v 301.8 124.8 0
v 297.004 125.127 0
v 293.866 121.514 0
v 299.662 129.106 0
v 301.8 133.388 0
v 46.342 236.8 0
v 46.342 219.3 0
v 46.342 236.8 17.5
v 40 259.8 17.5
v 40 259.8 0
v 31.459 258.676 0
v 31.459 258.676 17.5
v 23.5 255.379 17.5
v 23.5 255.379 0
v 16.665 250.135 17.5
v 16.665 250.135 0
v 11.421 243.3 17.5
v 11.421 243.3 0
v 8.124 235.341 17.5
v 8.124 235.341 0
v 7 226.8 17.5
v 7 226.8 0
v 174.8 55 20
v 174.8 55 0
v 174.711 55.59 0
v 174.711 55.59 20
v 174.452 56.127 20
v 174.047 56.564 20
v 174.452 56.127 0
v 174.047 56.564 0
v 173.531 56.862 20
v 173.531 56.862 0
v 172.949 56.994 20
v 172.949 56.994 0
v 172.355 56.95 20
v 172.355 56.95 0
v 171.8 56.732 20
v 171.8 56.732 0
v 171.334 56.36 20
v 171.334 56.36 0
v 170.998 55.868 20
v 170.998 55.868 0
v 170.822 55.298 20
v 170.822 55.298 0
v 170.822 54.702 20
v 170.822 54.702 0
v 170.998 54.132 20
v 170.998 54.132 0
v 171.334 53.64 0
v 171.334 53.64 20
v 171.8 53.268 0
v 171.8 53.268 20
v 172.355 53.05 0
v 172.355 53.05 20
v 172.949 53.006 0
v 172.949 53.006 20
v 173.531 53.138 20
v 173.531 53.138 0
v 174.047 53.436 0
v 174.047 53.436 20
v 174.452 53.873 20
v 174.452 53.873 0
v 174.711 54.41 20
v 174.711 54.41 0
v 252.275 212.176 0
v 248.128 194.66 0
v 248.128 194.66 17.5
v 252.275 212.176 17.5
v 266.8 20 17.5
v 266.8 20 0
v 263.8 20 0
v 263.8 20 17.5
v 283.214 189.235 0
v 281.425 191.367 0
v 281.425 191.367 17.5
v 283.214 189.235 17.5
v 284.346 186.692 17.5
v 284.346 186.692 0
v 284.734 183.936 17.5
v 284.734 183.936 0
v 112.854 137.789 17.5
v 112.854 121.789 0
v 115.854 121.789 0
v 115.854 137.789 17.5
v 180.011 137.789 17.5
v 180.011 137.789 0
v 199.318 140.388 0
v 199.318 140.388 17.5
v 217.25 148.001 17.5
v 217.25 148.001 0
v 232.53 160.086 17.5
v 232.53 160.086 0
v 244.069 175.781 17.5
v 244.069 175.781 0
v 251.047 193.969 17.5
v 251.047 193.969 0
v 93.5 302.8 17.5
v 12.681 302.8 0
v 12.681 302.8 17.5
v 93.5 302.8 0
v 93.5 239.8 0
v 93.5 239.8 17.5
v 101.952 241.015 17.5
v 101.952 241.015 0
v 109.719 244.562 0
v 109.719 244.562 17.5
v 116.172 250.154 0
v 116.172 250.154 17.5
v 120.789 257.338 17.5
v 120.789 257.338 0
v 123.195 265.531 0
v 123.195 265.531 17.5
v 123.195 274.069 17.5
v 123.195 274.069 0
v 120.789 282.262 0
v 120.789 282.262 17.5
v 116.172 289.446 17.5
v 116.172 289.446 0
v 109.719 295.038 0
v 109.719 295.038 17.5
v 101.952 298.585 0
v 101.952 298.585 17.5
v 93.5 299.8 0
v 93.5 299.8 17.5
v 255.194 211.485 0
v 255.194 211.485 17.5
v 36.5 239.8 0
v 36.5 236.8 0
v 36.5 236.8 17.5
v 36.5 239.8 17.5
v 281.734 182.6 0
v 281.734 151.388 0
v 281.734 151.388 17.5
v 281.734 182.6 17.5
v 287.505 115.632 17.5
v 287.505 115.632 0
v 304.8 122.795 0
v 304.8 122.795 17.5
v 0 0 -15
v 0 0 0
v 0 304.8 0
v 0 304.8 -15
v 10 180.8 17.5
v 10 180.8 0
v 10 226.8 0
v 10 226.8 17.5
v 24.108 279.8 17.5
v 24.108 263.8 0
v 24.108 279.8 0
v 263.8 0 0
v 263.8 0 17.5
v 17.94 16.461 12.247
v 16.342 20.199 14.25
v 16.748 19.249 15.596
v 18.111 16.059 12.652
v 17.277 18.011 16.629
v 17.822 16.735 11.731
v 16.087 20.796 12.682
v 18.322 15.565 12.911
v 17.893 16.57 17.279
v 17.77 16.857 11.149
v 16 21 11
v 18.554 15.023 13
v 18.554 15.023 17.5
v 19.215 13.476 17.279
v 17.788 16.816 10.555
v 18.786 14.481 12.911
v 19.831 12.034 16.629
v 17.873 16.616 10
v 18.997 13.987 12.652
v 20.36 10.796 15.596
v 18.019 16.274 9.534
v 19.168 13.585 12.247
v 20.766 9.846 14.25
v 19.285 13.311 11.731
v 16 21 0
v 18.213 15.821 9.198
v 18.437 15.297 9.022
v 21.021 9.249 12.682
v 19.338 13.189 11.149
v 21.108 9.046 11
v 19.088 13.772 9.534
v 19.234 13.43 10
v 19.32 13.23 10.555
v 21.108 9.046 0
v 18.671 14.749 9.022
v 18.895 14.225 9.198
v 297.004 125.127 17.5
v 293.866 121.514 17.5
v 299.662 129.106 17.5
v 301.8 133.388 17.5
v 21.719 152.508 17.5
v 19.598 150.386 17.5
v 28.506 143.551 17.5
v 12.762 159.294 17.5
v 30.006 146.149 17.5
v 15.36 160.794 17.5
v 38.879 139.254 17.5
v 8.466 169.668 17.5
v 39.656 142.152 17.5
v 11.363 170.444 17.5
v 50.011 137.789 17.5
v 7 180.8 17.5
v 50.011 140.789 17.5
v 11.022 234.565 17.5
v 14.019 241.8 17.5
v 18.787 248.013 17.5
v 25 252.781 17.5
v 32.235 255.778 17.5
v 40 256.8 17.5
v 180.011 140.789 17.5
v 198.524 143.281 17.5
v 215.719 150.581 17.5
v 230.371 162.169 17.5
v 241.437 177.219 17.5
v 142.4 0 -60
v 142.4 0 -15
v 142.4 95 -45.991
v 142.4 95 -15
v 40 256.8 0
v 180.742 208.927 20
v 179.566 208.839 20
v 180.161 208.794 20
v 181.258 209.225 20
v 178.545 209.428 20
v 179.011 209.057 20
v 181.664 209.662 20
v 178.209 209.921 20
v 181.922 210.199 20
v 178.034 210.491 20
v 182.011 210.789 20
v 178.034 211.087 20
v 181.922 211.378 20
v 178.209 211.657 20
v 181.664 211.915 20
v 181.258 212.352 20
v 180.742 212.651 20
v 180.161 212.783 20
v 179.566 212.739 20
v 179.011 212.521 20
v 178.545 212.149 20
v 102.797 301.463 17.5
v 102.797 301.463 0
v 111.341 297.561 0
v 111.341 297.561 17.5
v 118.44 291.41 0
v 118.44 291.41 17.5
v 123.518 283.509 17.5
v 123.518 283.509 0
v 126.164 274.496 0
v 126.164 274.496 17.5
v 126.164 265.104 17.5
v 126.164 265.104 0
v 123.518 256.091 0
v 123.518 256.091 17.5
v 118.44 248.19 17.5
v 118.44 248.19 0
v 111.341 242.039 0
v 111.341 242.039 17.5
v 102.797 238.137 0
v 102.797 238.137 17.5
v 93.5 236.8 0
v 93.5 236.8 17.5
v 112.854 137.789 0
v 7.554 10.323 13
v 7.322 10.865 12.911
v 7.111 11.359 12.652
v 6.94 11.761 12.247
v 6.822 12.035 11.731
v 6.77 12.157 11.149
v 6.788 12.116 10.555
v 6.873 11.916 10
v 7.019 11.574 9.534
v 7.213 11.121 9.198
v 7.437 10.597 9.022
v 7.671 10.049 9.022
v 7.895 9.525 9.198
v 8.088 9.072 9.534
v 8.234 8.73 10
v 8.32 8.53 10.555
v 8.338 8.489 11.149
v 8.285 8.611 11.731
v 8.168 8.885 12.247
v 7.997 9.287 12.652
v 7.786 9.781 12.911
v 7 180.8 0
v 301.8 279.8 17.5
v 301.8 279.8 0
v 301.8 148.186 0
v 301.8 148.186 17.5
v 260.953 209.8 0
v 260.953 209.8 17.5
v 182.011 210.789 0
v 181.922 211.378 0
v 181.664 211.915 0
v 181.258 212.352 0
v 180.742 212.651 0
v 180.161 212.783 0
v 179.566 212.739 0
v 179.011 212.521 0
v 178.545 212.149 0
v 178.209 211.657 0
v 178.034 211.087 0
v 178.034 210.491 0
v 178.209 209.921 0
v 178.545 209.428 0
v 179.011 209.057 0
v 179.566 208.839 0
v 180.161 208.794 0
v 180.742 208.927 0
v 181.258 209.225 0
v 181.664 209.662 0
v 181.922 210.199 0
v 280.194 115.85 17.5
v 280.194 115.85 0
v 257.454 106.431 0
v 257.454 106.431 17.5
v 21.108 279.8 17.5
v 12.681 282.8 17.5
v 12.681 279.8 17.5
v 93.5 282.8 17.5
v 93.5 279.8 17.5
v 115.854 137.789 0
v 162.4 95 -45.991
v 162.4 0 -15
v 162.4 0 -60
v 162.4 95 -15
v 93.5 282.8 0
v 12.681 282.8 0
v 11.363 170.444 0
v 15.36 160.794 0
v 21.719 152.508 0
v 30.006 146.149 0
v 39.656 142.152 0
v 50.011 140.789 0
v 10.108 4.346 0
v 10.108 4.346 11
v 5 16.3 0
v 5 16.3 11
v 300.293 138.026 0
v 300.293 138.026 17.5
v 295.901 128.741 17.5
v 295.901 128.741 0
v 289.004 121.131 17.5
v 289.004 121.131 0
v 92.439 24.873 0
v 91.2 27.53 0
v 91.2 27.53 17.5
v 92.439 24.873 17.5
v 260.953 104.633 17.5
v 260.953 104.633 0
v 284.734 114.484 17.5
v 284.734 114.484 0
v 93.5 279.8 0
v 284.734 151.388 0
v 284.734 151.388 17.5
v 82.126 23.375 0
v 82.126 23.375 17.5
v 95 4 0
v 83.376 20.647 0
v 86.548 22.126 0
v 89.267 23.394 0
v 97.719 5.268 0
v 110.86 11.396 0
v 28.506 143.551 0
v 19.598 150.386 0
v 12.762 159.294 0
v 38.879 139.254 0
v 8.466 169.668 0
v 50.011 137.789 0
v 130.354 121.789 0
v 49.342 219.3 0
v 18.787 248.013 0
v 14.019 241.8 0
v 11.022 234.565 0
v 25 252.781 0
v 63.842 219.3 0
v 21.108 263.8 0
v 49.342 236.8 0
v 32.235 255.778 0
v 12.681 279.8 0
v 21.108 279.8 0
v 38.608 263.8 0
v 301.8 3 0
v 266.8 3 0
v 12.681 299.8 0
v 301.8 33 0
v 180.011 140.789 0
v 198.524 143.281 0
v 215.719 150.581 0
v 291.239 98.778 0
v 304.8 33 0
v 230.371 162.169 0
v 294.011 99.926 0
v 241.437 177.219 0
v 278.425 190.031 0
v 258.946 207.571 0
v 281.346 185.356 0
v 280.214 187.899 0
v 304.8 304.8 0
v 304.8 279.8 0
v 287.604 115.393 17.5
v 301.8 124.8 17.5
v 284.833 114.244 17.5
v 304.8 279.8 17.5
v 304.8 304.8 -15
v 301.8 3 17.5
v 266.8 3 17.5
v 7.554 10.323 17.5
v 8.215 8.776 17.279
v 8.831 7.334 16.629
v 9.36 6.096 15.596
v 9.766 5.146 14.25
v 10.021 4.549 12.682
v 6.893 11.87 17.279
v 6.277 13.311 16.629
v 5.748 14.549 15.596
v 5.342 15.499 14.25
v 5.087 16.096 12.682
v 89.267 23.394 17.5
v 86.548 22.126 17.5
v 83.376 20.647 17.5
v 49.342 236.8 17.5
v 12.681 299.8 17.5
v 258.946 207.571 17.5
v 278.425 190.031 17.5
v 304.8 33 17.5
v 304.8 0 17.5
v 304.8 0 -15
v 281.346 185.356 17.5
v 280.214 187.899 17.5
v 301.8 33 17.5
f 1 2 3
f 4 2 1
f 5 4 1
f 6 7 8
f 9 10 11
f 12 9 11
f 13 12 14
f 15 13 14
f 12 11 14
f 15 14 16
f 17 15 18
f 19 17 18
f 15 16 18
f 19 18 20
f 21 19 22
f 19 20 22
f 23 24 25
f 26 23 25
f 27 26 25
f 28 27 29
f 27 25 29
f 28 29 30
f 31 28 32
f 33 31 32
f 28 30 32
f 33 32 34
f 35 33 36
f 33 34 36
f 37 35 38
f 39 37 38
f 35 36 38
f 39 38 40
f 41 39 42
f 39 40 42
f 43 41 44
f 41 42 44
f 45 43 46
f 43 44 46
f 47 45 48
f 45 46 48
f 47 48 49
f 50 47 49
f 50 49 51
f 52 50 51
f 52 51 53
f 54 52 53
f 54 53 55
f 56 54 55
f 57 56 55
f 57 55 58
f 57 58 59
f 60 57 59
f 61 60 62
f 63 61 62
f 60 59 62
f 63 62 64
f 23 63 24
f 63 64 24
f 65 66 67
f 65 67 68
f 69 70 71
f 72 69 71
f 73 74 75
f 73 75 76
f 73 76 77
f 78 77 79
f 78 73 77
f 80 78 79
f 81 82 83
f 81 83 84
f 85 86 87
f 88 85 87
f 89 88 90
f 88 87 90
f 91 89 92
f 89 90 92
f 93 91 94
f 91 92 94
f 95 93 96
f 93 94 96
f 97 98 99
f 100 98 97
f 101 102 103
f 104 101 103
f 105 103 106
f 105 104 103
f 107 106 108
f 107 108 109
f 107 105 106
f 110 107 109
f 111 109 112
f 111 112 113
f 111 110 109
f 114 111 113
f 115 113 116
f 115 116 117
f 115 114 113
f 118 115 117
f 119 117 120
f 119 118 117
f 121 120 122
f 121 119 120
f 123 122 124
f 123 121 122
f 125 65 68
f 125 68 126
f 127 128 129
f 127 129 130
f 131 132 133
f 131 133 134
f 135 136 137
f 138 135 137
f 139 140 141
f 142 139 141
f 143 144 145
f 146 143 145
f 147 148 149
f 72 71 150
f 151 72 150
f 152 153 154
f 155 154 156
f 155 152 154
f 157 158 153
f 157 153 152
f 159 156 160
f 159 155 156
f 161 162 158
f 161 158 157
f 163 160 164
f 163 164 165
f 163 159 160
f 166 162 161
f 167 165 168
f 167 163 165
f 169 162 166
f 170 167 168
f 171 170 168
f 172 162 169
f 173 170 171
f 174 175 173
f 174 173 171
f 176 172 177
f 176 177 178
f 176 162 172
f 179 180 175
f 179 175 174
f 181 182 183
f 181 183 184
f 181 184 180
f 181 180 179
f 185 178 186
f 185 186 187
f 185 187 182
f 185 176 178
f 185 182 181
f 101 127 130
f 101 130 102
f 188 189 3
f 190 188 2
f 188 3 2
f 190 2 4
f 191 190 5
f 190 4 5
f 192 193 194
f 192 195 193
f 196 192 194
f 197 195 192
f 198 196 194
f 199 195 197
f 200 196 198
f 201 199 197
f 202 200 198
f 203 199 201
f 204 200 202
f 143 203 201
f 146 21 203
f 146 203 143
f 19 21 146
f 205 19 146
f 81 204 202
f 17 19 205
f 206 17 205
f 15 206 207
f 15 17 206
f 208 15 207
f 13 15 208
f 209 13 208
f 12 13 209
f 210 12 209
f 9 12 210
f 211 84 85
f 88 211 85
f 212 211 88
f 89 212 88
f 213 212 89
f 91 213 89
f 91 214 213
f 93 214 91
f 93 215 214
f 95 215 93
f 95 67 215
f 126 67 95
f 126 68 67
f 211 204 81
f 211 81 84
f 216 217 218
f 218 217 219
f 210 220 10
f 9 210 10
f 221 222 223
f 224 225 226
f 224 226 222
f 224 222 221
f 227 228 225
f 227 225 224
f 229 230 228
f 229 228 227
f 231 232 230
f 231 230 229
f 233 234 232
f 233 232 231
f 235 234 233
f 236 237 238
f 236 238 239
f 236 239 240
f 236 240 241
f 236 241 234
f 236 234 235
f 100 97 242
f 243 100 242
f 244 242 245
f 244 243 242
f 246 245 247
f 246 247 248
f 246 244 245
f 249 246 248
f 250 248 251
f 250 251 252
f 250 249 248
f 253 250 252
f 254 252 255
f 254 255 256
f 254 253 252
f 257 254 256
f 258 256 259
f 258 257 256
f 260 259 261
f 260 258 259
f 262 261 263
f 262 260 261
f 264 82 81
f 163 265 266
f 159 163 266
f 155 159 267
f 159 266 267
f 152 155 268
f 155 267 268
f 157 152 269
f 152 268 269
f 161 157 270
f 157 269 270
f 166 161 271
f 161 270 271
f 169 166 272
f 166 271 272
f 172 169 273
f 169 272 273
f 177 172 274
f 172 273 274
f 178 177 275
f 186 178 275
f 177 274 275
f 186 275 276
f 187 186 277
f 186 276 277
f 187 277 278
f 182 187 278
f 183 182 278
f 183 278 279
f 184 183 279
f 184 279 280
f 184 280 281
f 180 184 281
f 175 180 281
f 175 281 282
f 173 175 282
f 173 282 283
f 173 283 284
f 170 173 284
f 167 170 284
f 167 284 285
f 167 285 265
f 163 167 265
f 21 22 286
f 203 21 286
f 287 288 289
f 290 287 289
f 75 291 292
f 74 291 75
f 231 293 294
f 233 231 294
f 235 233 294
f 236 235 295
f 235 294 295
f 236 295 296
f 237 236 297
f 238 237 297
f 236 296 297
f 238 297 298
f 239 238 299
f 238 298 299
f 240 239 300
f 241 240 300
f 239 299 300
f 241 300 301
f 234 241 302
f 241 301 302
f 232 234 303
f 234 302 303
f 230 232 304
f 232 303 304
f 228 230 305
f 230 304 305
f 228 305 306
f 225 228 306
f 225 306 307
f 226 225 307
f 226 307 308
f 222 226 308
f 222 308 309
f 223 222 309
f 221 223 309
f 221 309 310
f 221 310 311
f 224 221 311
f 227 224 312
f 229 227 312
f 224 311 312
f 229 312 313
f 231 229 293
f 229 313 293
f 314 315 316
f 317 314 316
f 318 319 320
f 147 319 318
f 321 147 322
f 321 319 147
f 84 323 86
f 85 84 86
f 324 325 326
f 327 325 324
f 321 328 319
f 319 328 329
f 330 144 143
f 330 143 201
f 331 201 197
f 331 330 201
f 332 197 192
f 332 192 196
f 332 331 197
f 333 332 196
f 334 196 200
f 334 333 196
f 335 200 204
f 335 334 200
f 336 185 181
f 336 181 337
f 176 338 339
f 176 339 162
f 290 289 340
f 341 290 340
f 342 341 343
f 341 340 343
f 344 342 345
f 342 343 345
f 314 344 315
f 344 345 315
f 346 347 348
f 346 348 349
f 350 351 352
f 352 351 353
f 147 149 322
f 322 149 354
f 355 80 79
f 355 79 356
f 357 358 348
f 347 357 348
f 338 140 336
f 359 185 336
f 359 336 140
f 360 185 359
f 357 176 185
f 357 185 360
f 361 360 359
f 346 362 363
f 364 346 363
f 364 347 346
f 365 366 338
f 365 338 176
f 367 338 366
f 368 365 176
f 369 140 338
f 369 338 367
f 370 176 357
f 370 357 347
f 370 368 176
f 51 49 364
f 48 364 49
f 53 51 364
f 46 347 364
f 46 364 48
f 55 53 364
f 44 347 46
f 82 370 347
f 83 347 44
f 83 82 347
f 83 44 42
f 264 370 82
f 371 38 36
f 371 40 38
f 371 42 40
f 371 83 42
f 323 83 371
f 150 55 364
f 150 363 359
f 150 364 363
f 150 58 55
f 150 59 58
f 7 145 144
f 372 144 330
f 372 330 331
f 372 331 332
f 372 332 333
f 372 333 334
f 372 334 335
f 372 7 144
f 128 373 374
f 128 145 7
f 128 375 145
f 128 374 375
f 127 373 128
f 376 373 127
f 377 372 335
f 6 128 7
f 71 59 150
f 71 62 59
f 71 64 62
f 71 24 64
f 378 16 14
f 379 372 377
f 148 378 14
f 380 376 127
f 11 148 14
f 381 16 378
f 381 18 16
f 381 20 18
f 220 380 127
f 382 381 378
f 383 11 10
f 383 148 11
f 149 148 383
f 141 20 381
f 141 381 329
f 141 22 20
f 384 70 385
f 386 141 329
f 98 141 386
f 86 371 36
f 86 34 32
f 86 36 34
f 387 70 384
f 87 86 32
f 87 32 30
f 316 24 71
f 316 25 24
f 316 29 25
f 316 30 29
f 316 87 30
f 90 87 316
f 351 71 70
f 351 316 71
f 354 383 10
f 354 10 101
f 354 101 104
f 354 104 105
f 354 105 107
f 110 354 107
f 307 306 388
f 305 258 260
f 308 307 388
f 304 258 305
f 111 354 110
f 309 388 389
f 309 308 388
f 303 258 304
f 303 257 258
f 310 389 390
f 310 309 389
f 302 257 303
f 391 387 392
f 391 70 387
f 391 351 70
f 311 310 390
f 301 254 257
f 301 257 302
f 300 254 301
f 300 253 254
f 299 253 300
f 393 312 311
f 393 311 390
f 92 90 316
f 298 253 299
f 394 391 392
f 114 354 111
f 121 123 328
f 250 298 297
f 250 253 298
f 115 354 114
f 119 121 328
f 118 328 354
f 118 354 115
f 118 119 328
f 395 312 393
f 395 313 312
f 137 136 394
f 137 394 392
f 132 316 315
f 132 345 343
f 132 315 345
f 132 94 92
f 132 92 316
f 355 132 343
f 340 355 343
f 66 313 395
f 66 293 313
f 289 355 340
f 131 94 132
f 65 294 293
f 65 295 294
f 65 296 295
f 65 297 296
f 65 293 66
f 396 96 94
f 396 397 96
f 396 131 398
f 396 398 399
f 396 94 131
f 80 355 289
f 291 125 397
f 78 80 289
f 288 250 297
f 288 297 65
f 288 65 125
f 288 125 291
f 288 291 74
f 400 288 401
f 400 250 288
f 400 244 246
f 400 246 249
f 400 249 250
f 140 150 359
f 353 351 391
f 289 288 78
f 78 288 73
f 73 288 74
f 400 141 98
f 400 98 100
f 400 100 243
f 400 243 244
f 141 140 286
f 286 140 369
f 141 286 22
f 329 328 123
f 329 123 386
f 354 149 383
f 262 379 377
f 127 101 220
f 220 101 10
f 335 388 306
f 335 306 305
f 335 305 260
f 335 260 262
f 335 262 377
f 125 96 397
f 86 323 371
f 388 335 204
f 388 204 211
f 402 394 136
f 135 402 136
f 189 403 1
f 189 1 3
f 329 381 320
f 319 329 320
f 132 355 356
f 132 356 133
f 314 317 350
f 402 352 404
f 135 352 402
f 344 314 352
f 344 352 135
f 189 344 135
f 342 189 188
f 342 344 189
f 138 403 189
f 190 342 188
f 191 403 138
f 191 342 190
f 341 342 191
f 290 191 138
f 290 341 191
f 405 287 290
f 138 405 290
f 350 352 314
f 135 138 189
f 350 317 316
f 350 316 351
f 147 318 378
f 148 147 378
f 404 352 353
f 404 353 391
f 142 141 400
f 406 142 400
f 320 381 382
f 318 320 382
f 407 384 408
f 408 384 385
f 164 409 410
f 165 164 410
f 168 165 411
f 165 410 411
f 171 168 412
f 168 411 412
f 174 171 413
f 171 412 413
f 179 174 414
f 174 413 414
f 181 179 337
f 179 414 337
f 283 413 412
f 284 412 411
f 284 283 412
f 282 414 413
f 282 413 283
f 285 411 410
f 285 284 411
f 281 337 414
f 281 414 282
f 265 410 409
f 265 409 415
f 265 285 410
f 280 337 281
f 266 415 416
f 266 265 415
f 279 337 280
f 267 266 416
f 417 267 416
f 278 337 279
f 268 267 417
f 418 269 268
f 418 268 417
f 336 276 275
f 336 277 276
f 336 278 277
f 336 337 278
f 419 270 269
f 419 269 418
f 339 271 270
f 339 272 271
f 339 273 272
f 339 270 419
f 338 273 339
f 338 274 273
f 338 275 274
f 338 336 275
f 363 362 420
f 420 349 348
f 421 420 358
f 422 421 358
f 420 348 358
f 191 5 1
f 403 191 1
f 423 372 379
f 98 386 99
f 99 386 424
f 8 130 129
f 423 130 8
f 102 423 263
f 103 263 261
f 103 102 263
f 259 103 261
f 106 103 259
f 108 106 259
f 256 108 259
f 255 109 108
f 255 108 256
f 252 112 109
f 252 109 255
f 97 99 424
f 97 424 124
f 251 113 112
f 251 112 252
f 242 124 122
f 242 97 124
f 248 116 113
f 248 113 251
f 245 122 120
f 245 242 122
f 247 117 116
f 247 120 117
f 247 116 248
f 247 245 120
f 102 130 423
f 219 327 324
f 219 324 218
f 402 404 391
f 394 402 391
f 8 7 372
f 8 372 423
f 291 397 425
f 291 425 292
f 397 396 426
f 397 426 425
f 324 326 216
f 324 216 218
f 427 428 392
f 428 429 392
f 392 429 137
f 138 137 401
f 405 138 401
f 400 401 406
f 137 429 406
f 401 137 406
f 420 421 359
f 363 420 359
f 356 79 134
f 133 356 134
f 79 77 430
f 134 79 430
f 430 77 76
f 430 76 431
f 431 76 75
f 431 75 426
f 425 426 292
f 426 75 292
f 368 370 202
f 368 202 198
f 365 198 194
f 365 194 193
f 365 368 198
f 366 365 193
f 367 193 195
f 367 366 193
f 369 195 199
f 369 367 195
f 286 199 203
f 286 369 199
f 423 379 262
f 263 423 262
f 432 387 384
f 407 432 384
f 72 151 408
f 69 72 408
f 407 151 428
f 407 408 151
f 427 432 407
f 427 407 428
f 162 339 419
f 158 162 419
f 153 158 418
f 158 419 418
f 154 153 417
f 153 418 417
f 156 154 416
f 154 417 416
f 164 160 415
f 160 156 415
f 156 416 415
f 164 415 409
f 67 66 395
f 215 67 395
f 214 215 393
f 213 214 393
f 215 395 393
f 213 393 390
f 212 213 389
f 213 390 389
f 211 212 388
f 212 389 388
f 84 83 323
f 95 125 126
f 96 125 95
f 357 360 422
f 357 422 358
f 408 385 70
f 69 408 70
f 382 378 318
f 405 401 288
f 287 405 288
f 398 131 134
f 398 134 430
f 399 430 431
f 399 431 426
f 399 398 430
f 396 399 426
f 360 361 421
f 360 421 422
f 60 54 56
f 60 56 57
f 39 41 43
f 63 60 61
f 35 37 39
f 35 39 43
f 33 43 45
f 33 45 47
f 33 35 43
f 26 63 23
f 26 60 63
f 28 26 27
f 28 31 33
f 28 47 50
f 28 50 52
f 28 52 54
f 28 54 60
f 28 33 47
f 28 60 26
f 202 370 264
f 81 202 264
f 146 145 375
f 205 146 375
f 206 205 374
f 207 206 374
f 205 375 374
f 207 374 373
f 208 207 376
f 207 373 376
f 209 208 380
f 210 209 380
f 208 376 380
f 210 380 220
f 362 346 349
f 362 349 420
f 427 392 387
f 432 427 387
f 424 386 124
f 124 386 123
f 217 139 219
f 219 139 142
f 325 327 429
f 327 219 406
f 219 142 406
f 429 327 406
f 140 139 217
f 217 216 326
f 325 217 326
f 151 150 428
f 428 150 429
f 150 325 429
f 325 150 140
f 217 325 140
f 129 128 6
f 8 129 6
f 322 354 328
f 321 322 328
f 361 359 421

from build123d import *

# Parameters (mm, degrees)
SKETCH2_W           = 304.8
SKETCH2_H           = 304.8
BOSS_EXTRUDE1_DEPTH = 15
BOSS_EXTRUDE2_DEPTH = 17.5
CUT_EXTRUDE1_DEPTH  = 17.5
CUT_EXTRUDE2_DEPTH  = 17.5
CUT_EXTRUDE3_DEPTH  = 17.5
CUT_EXTRUDE4_DEPTH  = 17.5
CUT_EXTRUDE5_DEPTH  = 17.5
SKETCH2_5_R         = 2
BOSS_EXTRUDE3_DEPTH = 20
SKETCH8_W           = 20
SKETCH8_H           = 95
BOSS_EXTRUDE4_DEPTH = 45
CUT_EXTRUDE6_DEPTH  = 45
SKETCH11_W          = 12.681432754
SKETCH11_H          = 17.5
CUT_EXTRUDE8_DEPTH  = 35
SKETCH10_R          = 2
CUT_EXTRUDE7_DEPTH  = 45


with BuildPart() as part:
    # Sketch2 → Boss-Extrude1 (new body)
    with BuildSketch(Plane.XY):
        with Locations((152.4, 152.4)):
            Rectangle(SKETCH2_W, SKETCH2_H)
    extrude(amount=-BOSS_EXTRUDE1_DEPTH)

    # Sketch2<3> → Boss-Extrude2 (add)
    # profile 1 of 8: a face of its own
    with BuildSketch(Plane.XY):
        Polygon((93.5, 282.8), (0, 282.8), (0, 279.8), (21.107831574, 279.8), (21.107831574, 263.8), (24.107831574, 263.8), (24.107831574, 279.8), (93.5, 279.8), align=None)
    # profile 2 of 8: a face of its own
    with BuildSketch(Plane.XY):
        with BuildLine():
            Line((0, 302.8), (0, 299.8))
            Line((0, 299.8), (93.5, 299.8))
            ThreePointArc((93.5, 299.8), (123.5, 269.8), (93.5, 239.8))
            Line((93.5, 239.8), (36.5, 239.8))
            Line((36.5, 239.8), (36.5, 236.8))
            Line((36.5, 236.8), (46.34178582, 236.8))
            Line((46.34178582, 236.8), (46.34178582, 219.3))
            Line((46.34178582, 219.3), (49.34178582, 219.3))
            Line((49.34178582, 219.3), (49.34178582, 236.8))
            Line((49.34178582, 236.8), (93.5, 236.8))
            ThreePointArc((93.5, 236.8), (126.5, 269.8), (93.5, 302.8))
            Line((93.5, 302.8), (0, 302.8))
        make_face()
    # profile 3 of 8: a face of its own
    with BuildSketch(Plane.XY):
        Polygon((263.8, 20), (263.8, 0), (304.8, 0), (304.8, 33), (301.8, 33), (301.8, 3), (266.8, 3), (266.8, 20), align=None)
    # profile 4 of 8: a face of its own
    with BuildSketch(Plane.XY):
        with BuildLine():
            Line((304.8, 279.8), (301.8, 279.8))
            Line((301.8, 279.8), (301.8, 148.186252327))
            ThreePointArc((301.8, 148.186252327), (295.901436431, 128.741294171), (280.193920133, 115.850468689))
            Line((280.193920133, 115.850468689), (257.453782439, 106.431195246))
            Line((257.453782439, 106.431195246), (260.952988472, 104.633437242))
            Line((260.952988472, 104.633437242), (284.733622888, 114.483698539))
            Line((284.733622888, 114.483698539), (291.239241238, 98.777746486))
            Line((291.239241238, 98.777746486), (294.010879835, 99.925796783))
            Line((294.010879835, 99.925796783), (287.505261485, 115.631748836))
            Line((287.505261485, 115.631748836), (304.8, 122.795464086))
            Line((304.8, 122.795464086), (304.8, 279.8))
        make_face()
        with BuildLine():
            Line((301.8, 133.38760374), (301.8, 124.8))
            Line((301.8, 124.8), (293.866088671, 121.513666325))
            ThreePointArc((293.866088671, 121.513666325), (298.395845267, 127.074583472), (301.8, 133.38760374))
        make_face(mode=Mode.SUBTRACT)
    # profile 5 of 8: a face of its own
    with BuildSketch(Plane.XY):
        with BuildLine():
            ThreePointArc((10, 226.8), (18.786796564, 248.013203436), (40, 256.8))
            Line((40, 256.8), (40, 259.8))
            ThreePointArc((40, 259.8), (16.665476221, 250.134523779), (7, 226.8))
            Line((7, 226.8), (7, 180.8))
            ThreePointArc((7, 180.8), (19.597686711, 150.386493887), (50.011192824, 137.788807176))
            Line((50.011192824, 137.788807176), (112.853619172, 137.788807176))
            Line((112.853619172, 137.788807176), (112.853619172, 121.788807176))
            Line((112.853619172, 121.788807176), (115.853619172, 121.788807176))
            Line((115.853619172, 121.788807176), (115.853619172, 137.788807176))
            Line((115.853619172, 137.788807176), (180.011192824, 137.788807176))
            ThreePointArc((180.011192824, 137.788807176), (225.294551046, 153.531340693), (251.047093253, 193.969150516))
            Line((251.047093253, 193.969150516), (255.194405854, 211.484851991))
            Line((255.194405854, 211.484851991), (252.275122275, 212.176070758))
            Line((252.275122275, 212.176070758), (248.127809674, 194.660369283))
            ThreePointArc((248.127809674, 194.660369283), (223.433591119, 155.884387261), (180.011192824, 140.788807176))
            Line((180.011192824, 140.788807176), (50.011192824, 140.788807176))
            ThreePointArc((50.011192824, 140.788807176), (21.719007055, 152.507814231), (10, 180.8))
            Line((10, 180.8), (10, 226.8))
        make_face()
    # profile 6 of 8: a face of its own
    with BuildSketch(Plane.XY):
        with BuildLine():
            Line((281.733622888, 151.387820597), (284.733622888, 151.387820597))
            Line((284.733622888, 151.387820597), (284.733622888, 183.935533743))
            ThreePointArc((284.733622888, 183.935533743), (283.869077464, 188.002900174), (281.424928951, 191.366981998))
            Line((281.424928951, 191.366981998), (260.952988472, 209.8))
            Line((260.952988472, 209.8), (258.945596653, 207.570565524))
            Line((258.945596653, 207.570565524), (278.424928951, 190.031295942))
            ThreePointArc((278.424928951, 190.031295942), (280.869077464, 186.667214118), (281.733622888, 182.599847688))
            Line((281.733622888, 182.599847688), (281.733622888, 151.387820597))
        make_face()
    # profile 7 of 8: a face of its own
    with BuildSketch(Plane.XY):
        Polygon((86.547634765, 22.126155741), (95, 4), (97.718923361, 5.267854785), (89.266558126, 23.394010526), (92.438635381, 24.873174442), (91.199667441, 27.530149764), (82.126335472, 23.374526297), (83.375557511, 20.646991825), align=None)
    # profile 8 of 8: a face of its own
    with BuildSketch(Plane.XY):
        Polygon((16, 21), (5, 16.3), (10.107831574, 4.345500571), (21.107831574, 9.045500571), align=None)
    extrude(amount=BOSS_EXTRUDE2_DEPTH)

    # Sketch3 → Cut-Extrude1 (cut)
    with BuildSketch(Plane(origin=(79.564500346, 37.101535829, 0), x_dir=(0, 0, 1), z_dir=(-0.9063077870366483, -0.422618261740703, 0))):
        Polygon((17.5, -16.523503717), (0, -36.523503717), (17.5, -36.523503717), align=None)
    extrude(amount=-CUT_EXTRUDE1_DEPTH, mode=Mode.SUBTRACT)

    # Sketch4 → Cut-Extrude2 (cut)
    with BuildSketch(Plane(origin=(283.511449018, 117.434287271, 0), x_dir=(0, 0, 1), z_dir=(-0.923879532511288, -0.3826834323650868, 0))):
        Polygon((17.5, -3.452640544), (0, -20.19369423), (17.5, -20.19369423), align=None)
    extrude(amount=-CUT_EXTRUDE2_DEPTH, mode=Mode.SUBTRACT)

    # Sketch5 → Cut-Extrude3 (cut)
    with BuildSketch(Plane.ZY.offset(-112.853619172)):
        Polygon((17.5, 137.788807176), (17.5, 121.788807176), (0, 121.788807176), align=None)
    extrude(amount=-CUT_EXTRUDE3_DEPTH, mode=Mode.SUBTRACT)

    # Sketch6 → Cut-Extrude4 (cut)
    with BuildSketch(Plane.ZY.offset(-46.34178582)):
        Polygon((17.5, 236.8), (17.5, 219.3), (0, 219.3), align=None)
    extrude(amount=-CUT_EXTRUDE4_DEPTH, mode=Mode.SUBTRACT)

    # Sketch7 → Cut-Extrude5 (cut)
    with BuildSketch(Plane.ZY.offset(-21.107831574)):
        Polygon((17.5, 279.8), (0, 263.8), (17.5, 263.8), align=None)
    extrude(amount=-CUT_EXTRUDE5_DEPTH, mode=Mode.SUBTRACT)

    # Sketch2<5> → Boss-Extrude3 (add)
    with BuildSketch(Plane.XY):
        with Locations((180.011192824, 210.788807176)):
            Circle(SKETCH2_5_R)
        with Locations((172.8, 55)):
            Circle(SKETCH2_5_R)
    extrude(amount=BOSS_EXTRUDE3_DEPTH)

    # Sketch8 → Boss-Extrude4 (add)
    with BuildSketch(Plane(origin=(0, 0, -15), x_dir=(-1, 0, 0), z_dir=(0, 0, -1))):
        with Locations((-152.4, 47.5)):
            Rectangle(SKETCH8_W, SKETCH8_H)
    extrude(amount=BOSS_EXTRUDE4_DEPTH)

    # Sketch9 → Cut-Extrude6 (cut)
    with BuildSketch(Plane(origin=(162.4, 0, 0), x_dir=(0, 0, -1), z_dir=(1, 0, 0))):
        Polygon((45.99140235, 95), (60, 95), (60, 0), align=None)
    extrude(amount=-CUT_EXTRUDE6_DEPTH, mode=Mode.SUBTRACT)

    # Sketch11 → Cut-Extrude8 (cut)
    with BuildSketch(Plane.XZ.offset(-279.8)):
        with Locations((6.340716377, 8.75)):
            Rectangle(SKETCH11_W, SKETCH11_H)
    extrude(amount=-CUT_EXTRUDE8_DEPTH, mode=Mode.SUBTRACT)

    # Sketch10 → Cut-Extrude7 (cut)
    with BuildSketch(Plane(origin=(10.11747851, 4.322922636, 0), x_dir=(0, 0, 1), z_dir=(-0.9195768791852732, -0.39291012110643525, 0))):
        with BuildLine():
            Line((17.5, 13.024552525), (11, 13.024552525))
            ThreePointArc((11, 13.024552525), (15.596194078, 11.120746603), (17.5, 6.524552525))
            Line((17.5, 6.524552525), (17.5, 13.024552525))
        make_face()
        with BuildLine():
            Line((17.5, 0.024552525), (17.5, 6.524552525))
            ThreePointArc((17.5, 6.524552525), (15.596194078, 1.928358447), (11, 0.024552525))
            Line((11, 0.024552525), (17.5, 0.024552525))
        make_face()
        with Locations((11, 6.524552525)):
            Circle(SKETCH10_R)
    extrude(amount=-CUT_EXTRUDE7_DEPTH, mode=Mode.SUBTRACT)


solid = part.part
